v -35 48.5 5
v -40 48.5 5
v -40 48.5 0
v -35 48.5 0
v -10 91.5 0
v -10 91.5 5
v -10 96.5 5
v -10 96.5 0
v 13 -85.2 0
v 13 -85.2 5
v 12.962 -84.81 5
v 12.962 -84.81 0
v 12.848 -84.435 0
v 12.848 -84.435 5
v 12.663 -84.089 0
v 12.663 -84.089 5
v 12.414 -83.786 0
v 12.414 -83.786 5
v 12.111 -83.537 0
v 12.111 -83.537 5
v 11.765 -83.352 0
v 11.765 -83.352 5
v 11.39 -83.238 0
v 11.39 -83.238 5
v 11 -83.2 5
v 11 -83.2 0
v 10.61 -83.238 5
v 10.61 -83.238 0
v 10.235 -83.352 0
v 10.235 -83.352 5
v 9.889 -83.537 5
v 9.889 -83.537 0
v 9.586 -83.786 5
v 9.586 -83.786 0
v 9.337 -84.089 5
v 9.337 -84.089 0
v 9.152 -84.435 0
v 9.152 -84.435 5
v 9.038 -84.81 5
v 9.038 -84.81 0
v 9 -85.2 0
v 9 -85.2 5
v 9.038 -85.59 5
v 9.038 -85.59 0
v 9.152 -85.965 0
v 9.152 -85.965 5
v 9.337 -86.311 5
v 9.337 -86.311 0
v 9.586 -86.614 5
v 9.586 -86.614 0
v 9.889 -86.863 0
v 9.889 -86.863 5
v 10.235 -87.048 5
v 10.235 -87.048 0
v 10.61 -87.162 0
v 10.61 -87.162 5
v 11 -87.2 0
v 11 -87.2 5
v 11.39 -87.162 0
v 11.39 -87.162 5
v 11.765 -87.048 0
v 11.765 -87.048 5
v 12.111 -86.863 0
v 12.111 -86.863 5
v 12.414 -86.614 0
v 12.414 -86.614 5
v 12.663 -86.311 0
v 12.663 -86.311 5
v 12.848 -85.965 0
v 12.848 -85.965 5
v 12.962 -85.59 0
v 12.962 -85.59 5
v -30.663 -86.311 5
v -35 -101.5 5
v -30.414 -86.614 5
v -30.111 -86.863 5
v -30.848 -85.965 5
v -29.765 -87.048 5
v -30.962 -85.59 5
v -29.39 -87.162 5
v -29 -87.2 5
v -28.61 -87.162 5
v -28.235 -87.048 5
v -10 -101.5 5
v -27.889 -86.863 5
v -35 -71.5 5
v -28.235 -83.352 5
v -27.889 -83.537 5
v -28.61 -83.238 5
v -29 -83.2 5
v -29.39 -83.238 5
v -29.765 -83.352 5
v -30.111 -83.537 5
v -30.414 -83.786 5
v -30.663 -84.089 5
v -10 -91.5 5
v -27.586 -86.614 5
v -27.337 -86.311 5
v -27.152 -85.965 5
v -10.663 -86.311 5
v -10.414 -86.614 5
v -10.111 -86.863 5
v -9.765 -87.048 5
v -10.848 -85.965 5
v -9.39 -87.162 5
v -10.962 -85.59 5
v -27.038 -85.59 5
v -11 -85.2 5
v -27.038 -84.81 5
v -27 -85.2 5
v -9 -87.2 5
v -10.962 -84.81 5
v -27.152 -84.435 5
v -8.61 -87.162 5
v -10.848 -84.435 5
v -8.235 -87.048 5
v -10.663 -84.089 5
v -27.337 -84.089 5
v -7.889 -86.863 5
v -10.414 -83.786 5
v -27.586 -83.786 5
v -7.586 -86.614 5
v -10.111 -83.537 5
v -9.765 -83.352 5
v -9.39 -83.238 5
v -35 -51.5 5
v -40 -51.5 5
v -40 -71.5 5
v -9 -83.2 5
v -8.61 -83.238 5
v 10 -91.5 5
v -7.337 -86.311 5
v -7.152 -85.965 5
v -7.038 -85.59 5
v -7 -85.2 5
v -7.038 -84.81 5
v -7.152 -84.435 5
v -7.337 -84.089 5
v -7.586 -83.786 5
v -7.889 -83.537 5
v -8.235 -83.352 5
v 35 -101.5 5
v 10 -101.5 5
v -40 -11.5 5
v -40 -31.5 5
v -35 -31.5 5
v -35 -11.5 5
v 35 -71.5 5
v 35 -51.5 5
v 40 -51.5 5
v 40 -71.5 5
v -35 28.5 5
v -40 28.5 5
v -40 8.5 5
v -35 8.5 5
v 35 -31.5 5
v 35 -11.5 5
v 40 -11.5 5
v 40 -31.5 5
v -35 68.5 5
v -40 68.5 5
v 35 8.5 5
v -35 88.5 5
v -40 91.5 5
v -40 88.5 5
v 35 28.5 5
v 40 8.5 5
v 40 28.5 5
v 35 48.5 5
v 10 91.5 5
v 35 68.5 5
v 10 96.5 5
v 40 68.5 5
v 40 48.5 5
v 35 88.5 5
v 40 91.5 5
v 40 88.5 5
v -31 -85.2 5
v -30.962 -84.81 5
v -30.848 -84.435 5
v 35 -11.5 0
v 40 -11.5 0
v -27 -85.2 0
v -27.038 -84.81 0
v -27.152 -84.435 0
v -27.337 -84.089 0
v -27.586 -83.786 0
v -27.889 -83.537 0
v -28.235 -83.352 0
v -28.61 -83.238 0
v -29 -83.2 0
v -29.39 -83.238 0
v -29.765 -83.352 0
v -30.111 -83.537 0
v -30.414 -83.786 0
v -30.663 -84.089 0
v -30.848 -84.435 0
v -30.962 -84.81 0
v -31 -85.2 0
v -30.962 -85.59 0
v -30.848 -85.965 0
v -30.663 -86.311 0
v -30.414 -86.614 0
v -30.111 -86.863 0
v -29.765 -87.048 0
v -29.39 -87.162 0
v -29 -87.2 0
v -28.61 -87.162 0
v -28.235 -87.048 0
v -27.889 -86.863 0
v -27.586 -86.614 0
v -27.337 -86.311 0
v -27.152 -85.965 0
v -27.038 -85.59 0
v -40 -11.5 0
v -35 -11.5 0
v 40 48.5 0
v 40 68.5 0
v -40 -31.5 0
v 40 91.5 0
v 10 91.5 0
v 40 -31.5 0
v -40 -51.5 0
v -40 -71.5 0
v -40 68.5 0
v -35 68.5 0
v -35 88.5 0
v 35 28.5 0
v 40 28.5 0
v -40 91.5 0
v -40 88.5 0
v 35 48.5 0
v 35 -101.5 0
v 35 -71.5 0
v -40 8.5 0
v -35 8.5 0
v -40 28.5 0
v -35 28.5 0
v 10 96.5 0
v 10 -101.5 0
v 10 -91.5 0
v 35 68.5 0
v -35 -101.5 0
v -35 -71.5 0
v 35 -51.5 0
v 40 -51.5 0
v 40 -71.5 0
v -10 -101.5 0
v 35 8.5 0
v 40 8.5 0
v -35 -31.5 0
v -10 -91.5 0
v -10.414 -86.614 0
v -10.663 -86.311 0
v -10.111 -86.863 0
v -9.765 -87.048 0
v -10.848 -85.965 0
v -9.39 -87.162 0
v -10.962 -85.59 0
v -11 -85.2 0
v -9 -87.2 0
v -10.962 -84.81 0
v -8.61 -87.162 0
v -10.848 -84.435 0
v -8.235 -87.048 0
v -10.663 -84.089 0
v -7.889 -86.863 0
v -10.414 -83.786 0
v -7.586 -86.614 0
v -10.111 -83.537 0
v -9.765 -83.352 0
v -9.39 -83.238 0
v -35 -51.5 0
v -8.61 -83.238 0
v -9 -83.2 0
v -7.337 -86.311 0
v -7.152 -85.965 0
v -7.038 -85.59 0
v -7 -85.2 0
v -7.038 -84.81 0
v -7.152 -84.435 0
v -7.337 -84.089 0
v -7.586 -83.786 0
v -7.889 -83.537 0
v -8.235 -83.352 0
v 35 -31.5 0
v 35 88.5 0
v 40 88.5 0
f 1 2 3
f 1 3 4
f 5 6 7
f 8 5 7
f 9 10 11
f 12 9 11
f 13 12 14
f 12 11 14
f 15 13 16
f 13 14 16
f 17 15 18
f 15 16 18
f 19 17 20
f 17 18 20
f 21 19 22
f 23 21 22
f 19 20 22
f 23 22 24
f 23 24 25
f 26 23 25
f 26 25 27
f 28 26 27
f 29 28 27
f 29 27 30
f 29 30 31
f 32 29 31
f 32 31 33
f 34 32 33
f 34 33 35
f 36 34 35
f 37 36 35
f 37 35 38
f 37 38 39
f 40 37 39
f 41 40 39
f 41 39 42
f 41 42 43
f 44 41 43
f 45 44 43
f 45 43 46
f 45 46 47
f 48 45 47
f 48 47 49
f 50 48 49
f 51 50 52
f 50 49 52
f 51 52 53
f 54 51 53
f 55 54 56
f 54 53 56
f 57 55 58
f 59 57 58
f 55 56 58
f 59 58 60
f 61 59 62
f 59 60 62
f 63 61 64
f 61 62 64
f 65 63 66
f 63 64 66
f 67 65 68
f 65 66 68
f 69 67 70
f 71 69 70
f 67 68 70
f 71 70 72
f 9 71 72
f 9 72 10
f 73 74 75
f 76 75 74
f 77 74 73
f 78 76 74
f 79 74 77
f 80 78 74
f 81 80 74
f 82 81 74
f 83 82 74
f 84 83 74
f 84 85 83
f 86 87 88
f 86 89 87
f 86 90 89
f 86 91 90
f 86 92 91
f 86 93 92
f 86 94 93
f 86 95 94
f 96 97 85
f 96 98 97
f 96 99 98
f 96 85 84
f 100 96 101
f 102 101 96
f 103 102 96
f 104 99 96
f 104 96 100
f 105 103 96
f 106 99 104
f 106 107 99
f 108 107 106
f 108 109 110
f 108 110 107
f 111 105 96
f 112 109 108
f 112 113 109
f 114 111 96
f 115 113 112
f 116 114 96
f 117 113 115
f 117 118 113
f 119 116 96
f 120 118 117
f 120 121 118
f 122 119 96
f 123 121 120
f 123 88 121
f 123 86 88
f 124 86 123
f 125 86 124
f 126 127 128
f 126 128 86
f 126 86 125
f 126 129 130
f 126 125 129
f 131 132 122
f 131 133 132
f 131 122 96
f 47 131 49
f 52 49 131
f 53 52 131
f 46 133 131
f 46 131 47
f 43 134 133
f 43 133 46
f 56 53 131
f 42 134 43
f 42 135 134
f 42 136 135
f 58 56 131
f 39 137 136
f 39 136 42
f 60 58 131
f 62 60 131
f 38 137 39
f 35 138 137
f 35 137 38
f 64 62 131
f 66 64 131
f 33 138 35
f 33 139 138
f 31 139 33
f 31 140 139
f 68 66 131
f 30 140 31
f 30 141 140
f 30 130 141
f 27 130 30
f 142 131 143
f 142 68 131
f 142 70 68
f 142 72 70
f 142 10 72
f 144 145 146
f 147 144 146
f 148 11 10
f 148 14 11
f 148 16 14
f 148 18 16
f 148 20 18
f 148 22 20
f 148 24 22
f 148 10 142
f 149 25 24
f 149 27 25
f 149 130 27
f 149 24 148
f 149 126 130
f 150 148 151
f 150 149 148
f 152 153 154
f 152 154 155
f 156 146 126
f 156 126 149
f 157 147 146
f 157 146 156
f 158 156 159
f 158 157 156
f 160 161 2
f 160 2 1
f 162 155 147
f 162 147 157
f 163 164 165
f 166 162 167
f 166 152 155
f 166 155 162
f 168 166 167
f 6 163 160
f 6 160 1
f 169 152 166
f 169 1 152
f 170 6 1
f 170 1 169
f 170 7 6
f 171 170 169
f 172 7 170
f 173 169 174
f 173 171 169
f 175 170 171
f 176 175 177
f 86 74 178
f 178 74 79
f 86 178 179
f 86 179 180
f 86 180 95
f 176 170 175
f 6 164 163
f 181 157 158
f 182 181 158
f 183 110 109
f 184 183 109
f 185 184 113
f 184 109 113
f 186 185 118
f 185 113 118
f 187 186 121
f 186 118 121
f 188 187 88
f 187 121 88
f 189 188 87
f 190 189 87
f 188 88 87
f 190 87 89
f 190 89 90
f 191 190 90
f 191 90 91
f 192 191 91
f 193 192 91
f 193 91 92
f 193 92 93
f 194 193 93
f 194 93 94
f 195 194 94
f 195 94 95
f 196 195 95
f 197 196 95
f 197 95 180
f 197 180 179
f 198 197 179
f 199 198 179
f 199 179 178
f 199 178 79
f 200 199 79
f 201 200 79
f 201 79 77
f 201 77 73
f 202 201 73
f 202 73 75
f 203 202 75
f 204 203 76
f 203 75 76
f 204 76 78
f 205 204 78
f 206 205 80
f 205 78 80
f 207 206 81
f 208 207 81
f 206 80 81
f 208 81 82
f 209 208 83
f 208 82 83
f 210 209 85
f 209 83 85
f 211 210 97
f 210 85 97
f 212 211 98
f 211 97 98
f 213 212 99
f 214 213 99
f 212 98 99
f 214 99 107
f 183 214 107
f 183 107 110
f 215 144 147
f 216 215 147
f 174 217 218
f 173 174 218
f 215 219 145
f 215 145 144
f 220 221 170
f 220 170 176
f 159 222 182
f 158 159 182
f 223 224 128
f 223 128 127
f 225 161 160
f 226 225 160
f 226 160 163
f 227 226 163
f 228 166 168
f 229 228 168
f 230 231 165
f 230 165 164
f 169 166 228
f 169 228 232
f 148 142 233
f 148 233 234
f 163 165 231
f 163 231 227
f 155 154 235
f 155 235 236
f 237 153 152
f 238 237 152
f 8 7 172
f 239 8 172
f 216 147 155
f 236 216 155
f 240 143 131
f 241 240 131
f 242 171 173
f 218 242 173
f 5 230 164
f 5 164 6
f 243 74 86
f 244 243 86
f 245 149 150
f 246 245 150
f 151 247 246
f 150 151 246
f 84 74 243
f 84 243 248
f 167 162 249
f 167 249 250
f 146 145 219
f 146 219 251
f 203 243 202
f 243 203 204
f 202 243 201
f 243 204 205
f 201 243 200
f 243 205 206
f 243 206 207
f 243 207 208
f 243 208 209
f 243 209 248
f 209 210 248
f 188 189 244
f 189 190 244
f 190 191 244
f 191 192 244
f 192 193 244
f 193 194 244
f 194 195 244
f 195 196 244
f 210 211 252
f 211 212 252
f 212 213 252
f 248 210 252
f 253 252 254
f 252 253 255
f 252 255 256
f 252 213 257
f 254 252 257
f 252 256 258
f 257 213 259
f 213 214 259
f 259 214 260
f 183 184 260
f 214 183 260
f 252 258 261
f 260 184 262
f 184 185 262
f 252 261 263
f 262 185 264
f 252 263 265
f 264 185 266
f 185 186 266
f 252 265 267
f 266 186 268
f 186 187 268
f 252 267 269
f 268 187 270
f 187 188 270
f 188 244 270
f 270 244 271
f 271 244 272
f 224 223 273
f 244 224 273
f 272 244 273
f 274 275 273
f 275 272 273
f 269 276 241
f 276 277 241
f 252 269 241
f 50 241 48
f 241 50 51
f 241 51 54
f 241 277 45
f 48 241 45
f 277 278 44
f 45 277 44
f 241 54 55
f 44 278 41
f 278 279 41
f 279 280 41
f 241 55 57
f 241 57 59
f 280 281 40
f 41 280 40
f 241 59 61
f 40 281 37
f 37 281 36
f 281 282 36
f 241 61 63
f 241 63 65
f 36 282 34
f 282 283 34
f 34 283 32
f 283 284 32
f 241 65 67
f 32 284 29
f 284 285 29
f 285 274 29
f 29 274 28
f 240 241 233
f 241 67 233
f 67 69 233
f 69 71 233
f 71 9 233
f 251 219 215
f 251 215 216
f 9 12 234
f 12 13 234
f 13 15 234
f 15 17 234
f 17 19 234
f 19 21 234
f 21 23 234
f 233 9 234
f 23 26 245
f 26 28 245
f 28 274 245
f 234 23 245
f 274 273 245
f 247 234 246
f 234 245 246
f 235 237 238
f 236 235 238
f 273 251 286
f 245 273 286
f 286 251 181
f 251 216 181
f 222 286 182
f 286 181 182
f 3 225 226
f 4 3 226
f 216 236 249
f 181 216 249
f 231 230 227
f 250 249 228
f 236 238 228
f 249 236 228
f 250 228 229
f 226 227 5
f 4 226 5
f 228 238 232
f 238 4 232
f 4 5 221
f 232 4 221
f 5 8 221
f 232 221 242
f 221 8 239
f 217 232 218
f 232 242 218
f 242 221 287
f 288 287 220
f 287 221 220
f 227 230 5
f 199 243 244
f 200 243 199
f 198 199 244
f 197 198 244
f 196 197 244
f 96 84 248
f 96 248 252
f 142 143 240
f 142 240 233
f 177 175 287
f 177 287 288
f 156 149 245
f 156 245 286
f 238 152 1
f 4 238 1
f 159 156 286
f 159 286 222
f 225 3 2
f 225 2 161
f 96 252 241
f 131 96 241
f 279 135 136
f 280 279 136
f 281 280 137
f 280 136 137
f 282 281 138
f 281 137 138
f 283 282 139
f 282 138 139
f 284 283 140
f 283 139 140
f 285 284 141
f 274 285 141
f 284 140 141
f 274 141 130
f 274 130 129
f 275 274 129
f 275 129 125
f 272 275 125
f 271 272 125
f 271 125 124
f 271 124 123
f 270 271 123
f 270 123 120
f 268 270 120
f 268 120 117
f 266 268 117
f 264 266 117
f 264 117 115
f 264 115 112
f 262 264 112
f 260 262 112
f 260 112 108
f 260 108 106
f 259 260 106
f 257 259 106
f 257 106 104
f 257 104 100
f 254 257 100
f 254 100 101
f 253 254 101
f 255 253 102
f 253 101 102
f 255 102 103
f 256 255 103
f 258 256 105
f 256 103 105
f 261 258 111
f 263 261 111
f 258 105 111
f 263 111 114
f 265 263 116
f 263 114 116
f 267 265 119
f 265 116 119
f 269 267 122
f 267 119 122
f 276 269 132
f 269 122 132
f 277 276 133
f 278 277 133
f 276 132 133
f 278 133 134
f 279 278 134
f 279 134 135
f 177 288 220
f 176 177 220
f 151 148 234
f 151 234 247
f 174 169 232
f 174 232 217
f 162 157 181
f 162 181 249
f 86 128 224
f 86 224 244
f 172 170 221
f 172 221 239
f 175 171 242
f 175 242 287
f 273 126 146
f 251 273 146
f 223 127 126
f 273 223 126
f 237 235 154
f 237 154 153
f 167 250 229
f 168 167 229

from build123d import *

# Parameters (mm, degrees)
SKETCH_1_W                      = 80
SKETCH_1_H                      = 183
EXTRUDE_1_DEPTH                 = 5
CUT_EXTRUDE_1_REACH             = 101.986
SKETCH_2_W                      = 5
SKETCH_2_H                      = 20
CUT_EXTRUDE_1_DIRECTION_2_DEPTH = 100.986249055
PATTERN_LINEAR_1_COUNT          = 5
PATTERN_LINEAR_1_PITCH          = 40
CUT_EXTRUDE_3_REACH             = 101.986
SKETCH_4_W                      = 5
SKETCH_4_H                      = 20
PATTERN_LINEAR_4_COUNT          = 5
PATTERN_LINEAR_4_PITCH          = 40
SKETCH_5_W                      = 20
SKETCH_5_H                      = 5
EXTRUDE_2_DEPTH                 = 5
SKETCH_6_W                      = 25
SKETCH_6_H                      = 10
EXTRUDE_3_DEPTH                 = 5
CUT_EXTRUDE_4_REACH             = 111.212
SKETCH_7_R                      = 2
PATTERN_LINEAR_5_COUNT          = 2
PATTERN_LINEAR_5_PITCH          = 40
PATTERN_LINEAR_6_COUNT          = 2
PATTERN_LINEAR_6_PITCH          = 20


with BuildPart() as part:
    # 스케치1 → 보스-돌출1 (new body)
    with BuildSketch(Plane.XY):
        Rectangle(SKETCH_1_W, SKETCH_1_H)
    extrude(amount=EXTRUDE_1_DEPTH)

    # 스케치2 → 컷-돌출1 (cut, up to next)
    with BuildSketch(Plane.XY.offset(5), mode=Mode.PRIVATE) as cut_extrude_1_sk1:
        with Locations((-37.5, -81.5)):
            Rectangle(SKETCH_2_W, SKETCH_2_H)
    cut_extrude_1_tool1 = extrude(cut_extrude_1_sk1.sketch, amount=-CUT_EXTRUDE_1_REACH, mode=Mode.PRIVATE) & part.part
    cut_extrude_1 = cut_extrude_1_tool1.solids().sort_by_distance((-37.5, -81.5, 5))[0]
    add(cut_extrude_1, mode=Mode.SUBTRACT)

    # 스케치2 → 컷-돌출1 direction 2 (cut)
    with BuildSketch(Plane.XY.offset(5)):
        with Locations((-37.5, -81.5)):
            Rectangle(SKETCH_2_W, SKETCH_2_H)
    cut_extrude_1_direction_2 = extrude(amount=CUT_EXTRUDE_1_DIRECTION_2_DEPTH, mode=Mode.SUBTRACT)

    # 선형 패턴1: 컷-돌출1, 컷-돌출1 direction 2 ×5
    with Locations(*[(0, i * PATTERN_LINEAR_1_PITCH, 0) for i in range(1, PATTERN_LINEAR_1_COUNT)]):
        add(cut_extrude_1, mode=Mode.SUBTRACT)
        add(cut_extrude_1_direction_2, mode=Mode.SUBTRACT)

    # 스케치4 → 컷-돌출3 (cut, up to next)
    with BuildSketch(Plane.XY.offset(5), mode=Mode.PRIVATE) as cut_extrude_3_sk1:
        with Locations((37.5, -81.5)):
            Rectangle(SKETCH_4_W, SKETCH_4_H)
    cut_extrude_3_tool1 = extrude(cut_extrude_3_sk1.sketch, amount=-CUT_EXTRUDE_3_REACH, mode=Mode.PRIVATE) & part.part
    cut_extrude_3 = cut_extrude_3_tool1.solids().sort_by_distance((37.5, -81.5, 5))[0]
    add(cut_extrude_3, mode=Mode.SUBTRACT)

    # 선형 패턴4: 컷-돌출3 ×5
    with Locations(*[(0, i * PATTERN_LINEAR_4_PITCH, 0) for i in range(1, PATTERN_LINEAR_4_COUNT)]):
        add(cut_extrude_3, mode=Mode.SUBTRACT)

    # 스케치5 → 보스-돌출2 (add)
    with BuildSketch(Plane.XY.offset(5)):
        with Locations((0, 94)):
            Rectangle(SKETCH_5_W, SKETCH_5_H)
    extrude(amount=-EXTRUDE_2_DEPTH)

    # 스케치6 → 보스-돌출3 (add)
    with BuildSketch(Plane.XY.offset(5)):
        with Locations((-22.5, -96.5)):
            Rectangle(SKETCH_6_W, SKETCH_6_H)
        with Locations((22.5, -96.5)):
            Rectangle(SKETCH_6_W, SKETCH_6_H)
    extrude(amount=-EXTRUDE_3_DEPTH)

    # 스케치7 → 컷-돌출4 (cut, up to next)
    with BuildSketch(Plane.XY.offset(5), mode=Mode.PRIVATE) as cut_extrude_4_sk1:
        with Locations((-29, -85.2)):
            Circle(SKETCH_7_R)
    cut_extrude_4_tool1 = extrude(cut_extrude_4_sk1.sketch, amount=-CUT_EXTRUDE_4_REACH, mode=Mode.PRIVATE) & part.part
    cut_extrude_4 = cut_extrude_4_tool1.solids().sort_by_distance((-29, -85.2, 5))[0]
    add(cut_extrude_4, mode=Mode.SUBTRACT)

    # 선형 패턴5: 컷-돌출4 ×2
    with Locations(*[(i * PATTERN_LINEAR_5_PITCH, 0, 0) for i in range(1, PATTERN_LINEAR_5_COUNT)]):
        add(cut_extrude_4, mode=Mode.SUBTRACT)

    # 선형 패턴6: 컷-돌출4 ×2
    with Locations(*[(i * PATTERN_LINEAR_6_PITCH, 0, 0) for i in range(1, PATTERN_LINEAR_6_COUNT)]):
        add(cut_extrude_4, mode=Mode.SUBTRACT)


solid = part.part
